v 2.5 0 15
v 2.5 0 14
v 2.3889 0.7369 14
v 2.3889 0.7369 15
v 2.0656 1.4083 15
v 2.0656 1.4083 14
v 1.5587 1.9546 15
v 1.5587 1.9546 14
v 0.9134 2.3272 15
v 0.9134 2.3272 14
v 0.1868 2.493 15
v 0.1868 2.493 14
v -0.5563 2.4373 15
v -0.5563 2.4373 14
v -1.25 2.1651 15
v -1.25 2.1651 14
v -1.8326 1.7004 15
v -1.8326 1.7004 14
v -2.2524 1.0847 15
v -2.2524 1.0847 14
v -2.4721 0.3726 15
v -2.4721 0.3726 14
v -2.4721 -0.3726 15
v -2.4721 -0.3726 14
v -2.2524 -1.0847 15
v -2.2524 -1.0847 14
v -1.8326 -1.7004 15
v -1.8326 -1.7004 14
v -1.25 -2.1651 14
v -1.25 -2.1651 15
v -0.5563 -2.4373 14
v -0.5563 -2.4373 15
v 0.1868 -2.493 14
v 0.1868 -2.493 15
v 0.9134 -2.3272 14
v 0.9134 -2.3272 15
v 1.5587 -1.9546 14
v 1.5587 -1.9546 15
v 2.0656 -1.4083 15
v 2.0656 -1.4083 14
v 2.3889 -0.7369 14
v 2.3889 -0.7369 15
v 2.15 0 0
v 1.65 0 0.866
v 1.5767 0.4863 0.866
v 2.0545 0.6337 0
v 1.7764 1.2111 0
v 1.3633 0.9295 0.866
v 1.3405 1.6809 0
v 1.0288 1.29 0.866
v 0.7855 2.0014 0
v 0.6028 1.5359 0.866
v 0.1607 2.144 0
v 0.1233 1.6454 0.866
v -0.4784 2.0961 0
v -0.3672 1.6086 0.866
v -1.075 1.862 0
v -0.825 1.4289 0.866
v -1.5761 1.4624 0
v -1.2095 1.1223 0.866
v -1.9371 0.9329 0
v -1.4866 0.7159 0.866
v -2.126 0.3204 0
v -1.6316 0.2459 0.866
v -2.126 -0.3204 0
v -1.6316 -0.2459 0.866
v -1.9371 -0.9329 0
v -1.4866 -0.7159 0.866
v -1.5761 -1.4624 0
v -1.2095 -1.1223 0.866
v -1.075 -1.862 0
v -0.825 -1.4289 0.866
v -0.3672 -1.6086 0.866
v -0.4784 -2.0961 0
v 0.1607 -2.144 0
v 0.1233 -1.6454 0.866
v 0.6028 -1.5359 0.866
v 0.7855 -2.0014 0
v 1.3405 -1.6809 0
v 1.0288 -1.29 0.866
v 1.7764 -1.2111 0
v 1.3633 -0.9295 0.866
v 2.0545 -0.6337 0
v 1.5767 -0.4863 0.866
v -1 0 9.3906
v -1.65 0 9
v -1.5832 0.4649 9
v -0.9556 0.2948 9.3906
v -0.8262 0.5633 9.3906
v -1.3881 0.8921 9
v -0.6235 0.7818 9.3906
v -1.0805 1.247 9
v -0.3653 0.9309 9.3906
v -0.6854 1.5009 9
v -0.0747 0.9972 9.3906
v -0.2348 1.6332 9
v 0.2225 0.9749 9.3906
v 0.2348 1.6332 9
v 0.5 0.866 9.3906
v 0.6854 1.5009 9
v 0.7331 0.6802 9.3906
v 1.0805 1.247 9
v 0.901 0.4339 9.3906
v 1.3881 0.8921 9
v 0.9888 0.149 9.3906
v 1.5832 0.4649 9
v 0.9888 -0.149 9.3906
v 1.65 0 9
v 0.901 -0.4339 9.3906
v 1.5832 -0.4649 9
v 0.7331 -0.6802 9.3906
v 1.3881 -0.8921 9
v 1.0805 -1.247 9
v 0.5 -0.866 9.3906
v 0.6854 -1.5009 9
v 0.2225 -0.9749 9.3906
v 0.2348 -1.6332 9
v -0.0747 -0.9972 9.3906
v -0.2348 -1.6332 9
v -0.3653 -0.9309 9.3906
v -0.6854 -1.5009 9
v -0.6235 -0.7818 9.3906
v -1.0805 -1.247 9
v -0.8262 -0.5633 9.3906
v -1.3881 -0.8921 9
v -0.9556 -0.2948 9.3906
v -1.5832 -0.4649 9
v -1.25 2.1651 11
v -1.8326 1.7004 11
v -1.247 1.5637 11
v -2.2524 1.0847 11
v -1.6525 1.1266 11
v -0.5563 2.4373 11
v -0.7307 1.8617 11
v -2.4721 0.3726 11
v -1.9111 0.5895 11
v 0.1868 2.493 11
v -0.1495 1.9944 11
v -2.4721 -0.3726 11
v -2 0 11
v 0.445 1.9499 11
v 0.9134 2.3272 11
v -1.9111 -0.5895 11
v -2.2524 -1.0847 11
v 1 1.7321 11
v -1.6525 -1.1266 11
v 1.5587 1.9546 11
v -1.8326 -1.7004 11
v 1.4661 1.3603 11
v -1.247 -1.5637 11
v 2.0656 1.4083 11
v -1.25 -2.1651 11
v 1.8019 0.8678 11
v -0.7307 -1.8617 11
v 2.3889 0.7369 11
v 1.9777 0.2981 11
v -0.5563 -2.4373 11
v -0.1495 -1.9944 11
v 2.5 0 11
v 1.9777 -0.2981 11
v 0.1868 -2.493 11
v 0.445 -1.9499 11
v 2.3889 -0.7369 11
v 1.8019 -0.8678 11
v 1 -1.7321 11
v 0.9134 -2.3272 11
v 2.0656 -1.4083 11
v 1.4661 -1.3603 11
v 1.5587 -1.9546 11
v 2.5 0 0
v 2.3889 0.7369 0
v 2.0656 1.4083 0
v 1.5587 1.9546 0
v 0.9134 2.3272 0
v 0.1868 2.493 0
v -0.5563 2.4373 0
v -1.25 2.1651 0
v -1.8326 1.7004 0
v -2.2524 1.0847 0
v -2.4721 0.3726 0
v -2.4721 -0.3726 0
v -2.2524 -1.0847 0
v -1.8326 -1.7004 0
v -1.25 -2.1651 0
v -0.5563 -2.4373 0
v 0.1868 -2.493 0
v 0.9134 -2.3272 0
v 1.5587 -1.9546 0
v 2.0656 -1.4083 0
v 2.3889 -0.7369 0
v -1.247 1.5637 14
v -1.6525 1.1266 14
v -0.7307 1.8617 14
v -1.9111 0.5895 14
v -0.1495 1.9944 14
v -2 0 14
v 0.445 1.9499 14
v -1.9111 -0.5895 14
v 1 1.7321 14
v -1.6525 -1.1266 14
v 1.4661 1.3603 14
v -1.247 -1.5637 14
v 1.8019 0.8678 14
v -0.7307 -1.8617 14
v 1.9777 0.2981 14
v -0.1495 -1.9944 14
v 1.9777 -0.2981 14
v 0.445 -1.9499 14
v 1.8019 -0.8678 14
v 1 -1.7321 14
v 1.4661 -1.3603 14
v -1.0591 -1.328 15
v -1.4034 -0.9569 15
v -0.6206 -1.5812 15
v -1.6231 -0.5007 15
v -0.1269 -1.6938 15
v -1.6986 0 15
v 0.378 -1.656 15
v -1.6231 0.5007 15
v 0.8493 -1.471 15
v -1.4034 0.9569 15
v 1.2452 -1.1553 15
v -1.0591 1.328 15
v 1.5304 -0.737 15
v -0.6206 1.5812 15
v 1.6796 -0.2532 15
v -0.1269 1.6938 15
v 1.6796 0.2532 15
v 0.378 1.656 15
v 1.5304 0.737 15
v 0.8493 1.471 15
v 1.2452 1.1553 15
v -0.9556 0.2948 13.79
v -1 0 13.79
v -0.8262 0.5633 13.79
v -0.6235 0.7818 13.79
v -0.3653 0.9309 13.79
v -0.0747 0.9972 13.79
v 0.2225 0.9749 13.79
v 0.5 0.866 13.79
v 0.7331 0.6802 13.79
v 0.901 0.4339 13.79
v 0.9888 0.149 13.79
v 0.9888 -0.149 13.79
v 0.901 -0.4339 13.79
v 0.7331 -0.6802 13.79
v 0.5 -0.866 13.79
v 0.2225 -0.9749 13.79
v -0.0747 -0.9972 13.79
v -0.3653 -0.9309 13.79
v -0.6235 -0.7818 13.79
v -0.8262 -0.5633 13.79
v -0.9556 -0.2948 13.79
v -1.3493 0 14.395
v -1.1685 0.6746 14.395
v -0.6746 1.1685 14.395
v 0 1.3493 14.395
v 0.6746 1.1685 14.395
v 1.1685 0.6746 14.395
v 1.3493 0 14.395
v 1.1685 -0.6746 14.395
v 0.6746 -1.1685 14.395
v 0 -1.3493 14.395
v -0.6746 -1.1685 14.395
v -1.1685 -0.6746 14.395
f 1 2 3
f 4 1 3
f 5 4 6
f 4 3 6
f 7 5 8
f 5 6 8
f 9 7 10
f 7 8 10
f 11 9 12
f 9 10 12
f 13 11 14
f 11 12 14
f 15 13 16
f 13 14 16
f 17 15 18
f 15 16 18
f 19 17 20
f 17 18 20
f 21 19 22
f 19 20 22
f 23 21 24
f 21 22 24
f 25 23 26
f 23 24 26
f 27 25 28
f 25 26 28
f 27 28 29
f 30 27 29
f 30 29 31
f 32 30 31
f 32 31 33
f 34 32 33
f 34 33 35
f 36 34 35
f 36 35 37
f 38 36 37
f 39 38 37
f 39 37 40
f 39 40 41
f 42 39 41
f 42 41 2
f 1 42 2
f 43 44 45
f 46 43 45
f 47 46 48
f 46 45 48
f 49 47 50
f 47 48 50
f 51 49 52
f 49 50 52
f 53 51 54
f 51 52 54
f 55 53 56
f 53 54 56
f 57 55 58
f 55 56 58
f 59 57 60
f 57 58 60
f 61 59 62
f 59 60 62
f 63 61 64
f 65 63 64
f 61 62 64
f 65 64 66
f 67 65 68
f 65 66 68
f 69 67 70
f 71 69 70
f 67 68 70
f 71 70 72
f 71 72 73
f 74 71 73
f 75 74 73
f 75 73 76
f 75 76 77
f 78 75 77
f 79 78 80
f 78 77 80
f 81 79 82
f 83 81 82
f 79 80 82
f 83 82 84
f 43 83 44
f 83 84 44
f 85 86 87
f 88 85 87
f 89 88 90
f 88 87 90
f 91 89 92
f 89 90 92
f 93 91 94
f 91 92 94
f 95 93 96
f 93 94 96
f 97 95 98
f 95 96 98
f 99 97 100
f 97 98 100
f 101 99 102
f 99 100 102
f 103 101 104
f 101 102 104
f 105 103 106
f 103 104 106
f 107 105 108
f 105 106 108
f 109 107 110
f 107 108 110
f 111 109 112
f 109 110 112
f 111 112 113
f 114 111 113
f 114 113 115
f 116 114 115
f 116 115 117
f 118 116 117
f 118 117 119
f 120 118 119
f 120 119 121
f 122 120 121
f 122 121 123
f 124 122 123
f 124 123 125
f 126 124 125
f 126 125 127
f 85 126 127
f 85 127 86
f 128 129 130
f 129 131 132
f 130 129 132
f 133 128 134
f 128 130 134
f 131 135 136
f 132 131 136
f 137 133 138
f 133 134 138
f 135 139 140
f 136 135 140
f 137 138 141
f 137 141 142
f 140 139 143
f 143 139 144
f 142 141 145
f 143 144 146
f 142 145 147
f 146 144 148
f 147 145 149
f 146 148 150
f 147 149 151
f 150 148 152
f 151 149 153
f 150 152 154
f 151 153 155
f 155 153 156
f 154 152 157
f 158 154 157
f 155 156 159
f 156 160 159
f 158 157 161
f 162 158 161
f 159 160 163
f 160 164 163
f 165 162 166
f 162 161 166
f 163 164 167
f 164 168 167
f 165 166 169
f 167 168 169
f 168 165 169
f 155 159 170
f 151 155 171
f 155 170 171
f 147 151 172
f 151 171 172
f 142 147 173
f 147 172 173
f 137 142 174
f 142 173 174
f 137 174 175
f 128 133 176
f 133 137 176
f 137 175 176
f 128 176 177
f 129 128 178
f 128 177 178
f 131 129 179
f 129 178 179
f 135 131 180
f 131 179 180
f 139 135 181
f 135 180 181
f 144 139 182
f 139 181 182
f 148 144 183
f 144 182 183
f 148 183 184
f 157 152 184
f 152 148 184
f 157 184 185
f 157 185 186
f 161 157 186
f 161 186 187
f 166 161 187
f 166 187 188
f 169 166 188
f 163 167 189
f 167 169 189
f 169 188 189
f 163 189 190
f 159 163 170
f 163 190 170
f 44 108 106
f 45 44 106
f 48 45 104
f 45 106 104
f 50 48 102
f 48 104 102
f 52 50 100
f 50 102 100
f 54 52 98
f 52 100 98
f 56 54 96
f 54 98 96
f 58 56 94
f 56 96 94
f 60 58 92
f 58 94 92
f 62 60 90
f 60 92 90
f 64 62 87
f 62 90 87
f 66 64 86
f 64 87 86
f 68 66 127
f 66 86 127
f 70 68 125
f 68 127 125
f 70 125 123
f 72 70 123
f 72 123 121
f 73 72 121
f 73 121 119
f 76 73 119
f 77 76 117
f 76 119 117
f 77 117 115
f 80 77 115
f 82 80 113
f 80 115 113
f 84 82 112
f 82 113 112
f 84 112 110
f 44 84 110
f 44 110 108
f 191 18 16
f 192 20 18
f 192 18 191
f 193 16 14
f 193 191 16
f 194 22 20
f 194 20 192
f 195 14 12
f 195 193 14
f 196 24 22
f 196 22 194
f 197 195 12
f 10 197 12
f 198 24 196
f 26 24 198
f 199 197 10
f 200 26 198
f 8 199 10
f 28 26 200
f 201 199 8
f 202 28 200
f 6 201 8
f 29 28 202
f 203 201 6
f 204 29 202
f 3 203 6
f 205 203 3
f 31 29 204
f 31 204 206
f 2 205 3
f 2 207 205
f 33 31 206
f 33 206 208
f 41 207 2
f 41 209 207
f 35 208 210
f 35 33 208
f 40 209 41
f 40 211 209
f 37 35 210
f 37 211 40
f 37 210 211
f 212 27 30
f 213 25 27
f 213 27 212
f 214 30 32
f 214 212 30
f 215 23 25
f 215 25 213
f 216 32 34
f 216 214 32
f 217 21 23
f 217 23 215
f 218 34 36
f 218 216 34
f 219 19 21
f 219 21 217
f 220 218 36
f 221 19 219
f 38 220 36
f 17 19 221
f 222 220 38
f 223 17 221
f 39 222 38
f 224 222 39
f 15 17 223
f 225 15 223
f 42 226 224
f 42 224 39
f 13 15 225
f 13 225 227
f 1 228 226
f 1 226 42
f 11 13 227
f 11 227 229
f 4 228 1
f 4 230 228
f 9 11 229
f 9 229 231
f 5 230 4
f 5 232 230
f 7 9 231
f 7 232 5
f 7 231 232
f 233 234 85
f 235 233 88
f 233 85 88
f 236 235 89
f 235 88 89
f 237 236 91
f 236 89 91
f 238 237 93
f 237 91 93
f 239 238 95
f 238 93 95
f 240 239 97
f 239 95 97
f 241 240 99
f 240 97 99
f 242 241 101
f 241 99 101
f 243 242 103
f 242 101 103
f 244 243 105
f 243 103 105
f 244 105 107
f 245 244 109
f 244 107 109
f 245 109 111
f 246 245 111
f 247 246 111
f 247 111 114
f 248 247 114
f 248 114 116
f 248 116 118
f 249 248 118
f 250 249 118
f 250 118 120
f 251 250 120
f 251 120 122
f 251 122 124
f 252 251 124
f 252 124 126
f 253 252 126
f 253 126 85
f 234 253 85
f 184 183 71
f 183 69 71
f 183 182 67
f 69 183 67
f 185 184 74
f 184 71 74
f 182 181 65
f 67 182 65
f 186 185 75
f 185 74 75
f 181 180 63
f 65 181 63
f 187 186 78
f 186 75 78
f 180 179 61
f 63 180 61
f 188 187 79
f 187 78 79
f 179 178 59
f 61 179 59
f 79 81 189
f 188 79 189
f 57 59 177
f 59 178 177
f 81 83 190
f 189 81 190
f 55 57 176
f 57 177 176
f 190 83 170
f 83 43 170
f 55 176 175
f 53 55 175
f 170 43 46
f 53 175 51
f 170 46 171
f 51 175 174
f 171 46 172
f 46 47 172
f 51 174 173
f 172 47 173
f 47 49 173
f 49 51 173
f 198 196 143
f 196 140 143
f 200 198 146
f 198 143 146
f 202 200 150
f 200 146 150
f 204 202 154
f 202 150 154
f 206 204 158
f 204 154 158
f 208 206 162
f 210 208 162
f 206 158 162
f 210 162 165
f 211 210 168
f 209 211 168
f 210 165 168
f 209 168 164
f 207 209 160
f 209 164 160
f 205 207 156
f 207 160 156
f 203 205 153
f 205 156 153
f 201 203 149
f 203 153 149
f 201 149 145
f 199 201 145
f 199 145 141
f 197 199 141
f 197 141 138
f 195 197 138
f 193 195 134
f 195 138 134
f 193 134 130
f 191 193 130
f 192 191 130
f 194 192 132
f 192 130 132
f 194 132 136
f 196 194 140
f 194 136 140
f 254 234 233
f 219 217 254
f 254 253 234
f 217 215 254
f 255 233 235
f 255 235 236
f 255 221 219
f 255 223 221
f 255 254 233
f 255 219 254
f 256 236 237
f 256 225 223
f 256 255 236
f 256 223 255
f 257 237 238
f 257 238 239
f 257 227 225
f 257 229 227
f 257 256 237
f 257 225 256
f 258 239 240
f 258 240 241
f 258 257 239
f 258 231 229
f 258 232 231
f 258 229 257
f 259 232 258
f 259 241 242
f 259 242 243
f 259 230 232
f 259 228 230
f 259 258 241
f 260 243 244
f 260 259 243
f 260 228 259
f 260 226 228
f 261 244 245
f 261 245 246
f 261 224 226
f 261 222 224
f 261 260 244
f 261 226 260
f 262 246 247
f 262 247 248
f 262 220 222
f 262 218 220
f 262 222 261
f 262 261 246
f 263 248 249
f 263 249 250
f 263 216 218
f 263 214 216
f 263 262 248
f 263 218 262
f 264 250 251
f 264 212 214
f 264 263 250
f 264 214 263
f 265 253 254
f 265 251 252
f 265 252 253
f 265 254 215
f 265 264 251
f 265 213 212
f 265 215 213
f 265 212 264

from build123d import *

# Parameters (mm, degrees)
SKETCH1_R                       = 2.5
BOSS_EXTRUDE1_DEPTH             = 15
SKETCH2_R                       = 1
CUT_EXTRUDE1_DEPTH              = 16.411035007
TAP_DRILL_FOR_M4X0_7_TAP1_D     = 3.3
TAP_DRILL_FOR_M4X0_7_TAP1_DEPTH = 9
TAP_DRILL_FOR_M4X0_7_TAP1_TIP   = 0.991420021
SKETCH5_W                       = 3
SKETCH5_H                       = 1.793791595
CHAMFER1_SIZE                   = 0.5
CHAMFER1_SIZE2                  = 0.866025404
CHAMFER2_SIZE                   = 1.21
CHAMFER2_SIZE2                  = 0.698593826


with BuildPart() as part:
    # Sketch1 → Boss-Extrude1 (new body)
    with BuildSketch(Plane.XY):
        Circle(SKETCH1_R)
    extrude(amount=BOSS_EXTRUDE1_DEPTH)

    # Sketch2 → Cut-Extrude1 (cut, through all)
    with BuildSketch(Plane(origin=(0, 0, 0), x_dir=(-1, 0, 0), z_dir=(0, 0, -1))):
        Circle(SKETCH2_R)
    extrude(amount=-CUT_EXTRUDE1_DEPTH, mode=Mode.SUBTRACT)

    # Tap Drill for M4x0.7 Tap1
    with Locations(Plane(origin=(0, 0, 0), x_dir=(-1, 0, 0), z_dir=(0, 0, -1))):
        with Locations((0, 0)):
            Hole(TAP_DRILL_FOR_M4X0_7_TAP1_D / 2, depth=TAP_DRILL_FOR_M4X0_7_TAP1_DEPTH)
            with Locations((0, 0, -(TAP_DRILL_FOR_M4X0_7_TAP1_DEPTH + TAP_DRILL_FOR_M4X0_7_TAP1_TIP / 2))):  # 118° drill point
                Cone(0, TAP_DRILL_FOR_M4X0_7_TAP1_D / 2, TAP_DRILL_FOR_M4X0_7_TAP1_TIP, mode=Mode.SUBTRACT)

    # Sketch5 → Cut-Revolve1 (revolve, cut)
    with BuildSketch(Plane(origin=(0, 0, 0), x_dir=(0, 0, -1), z_dir=(1, 0, 0)), mode=Mode.PRIVATE) as cut_revolve1_sk:
        with Locations((-12.5, 2.896895798)):
            Rectangle(SKETCH5_W, SKETCH5_H)
    revolve(cut_revolve1_sk.sketch.rotate(Axis((0, 0, 0), (0, 0, 1)), 90), axis=Axis((0, 0, 0), (0, 0, 1)), mode=Mode.SUBTRACT)

    # Chamfer1
    chamfer1_edges = [part.edges().sort_by_distance(p)[0] for p in [
        (-1.65, 0, 0),
    ]]
    chamfer1_side = [part.faces().sort_by_distance(p)[0] for p in [
        (-2.429289322, 0, 0),
    ]]
    chamfer(chamfer1_edges, length=CHAMFER1_SIZE, length2=CHAMFER1_SIZE2, reference=chamfer1_side[0])

    # Chamfer2
    chamfer2_edges = [part.edges().sort_by_distance(p)[0] for p in [
        (1, 0, 15),
    ]]
    chamfer2_side = [part.faces().sort_by_distance(p)[0] for p in [
        (1, 0, 12.195279701),
    ]]
    chamfer(chamfer2_edges, length=CHAMFER2_SIZE, length2=CHAMFER2_SIZE2, reference=chamfer2_side[0])


solid = part.part
